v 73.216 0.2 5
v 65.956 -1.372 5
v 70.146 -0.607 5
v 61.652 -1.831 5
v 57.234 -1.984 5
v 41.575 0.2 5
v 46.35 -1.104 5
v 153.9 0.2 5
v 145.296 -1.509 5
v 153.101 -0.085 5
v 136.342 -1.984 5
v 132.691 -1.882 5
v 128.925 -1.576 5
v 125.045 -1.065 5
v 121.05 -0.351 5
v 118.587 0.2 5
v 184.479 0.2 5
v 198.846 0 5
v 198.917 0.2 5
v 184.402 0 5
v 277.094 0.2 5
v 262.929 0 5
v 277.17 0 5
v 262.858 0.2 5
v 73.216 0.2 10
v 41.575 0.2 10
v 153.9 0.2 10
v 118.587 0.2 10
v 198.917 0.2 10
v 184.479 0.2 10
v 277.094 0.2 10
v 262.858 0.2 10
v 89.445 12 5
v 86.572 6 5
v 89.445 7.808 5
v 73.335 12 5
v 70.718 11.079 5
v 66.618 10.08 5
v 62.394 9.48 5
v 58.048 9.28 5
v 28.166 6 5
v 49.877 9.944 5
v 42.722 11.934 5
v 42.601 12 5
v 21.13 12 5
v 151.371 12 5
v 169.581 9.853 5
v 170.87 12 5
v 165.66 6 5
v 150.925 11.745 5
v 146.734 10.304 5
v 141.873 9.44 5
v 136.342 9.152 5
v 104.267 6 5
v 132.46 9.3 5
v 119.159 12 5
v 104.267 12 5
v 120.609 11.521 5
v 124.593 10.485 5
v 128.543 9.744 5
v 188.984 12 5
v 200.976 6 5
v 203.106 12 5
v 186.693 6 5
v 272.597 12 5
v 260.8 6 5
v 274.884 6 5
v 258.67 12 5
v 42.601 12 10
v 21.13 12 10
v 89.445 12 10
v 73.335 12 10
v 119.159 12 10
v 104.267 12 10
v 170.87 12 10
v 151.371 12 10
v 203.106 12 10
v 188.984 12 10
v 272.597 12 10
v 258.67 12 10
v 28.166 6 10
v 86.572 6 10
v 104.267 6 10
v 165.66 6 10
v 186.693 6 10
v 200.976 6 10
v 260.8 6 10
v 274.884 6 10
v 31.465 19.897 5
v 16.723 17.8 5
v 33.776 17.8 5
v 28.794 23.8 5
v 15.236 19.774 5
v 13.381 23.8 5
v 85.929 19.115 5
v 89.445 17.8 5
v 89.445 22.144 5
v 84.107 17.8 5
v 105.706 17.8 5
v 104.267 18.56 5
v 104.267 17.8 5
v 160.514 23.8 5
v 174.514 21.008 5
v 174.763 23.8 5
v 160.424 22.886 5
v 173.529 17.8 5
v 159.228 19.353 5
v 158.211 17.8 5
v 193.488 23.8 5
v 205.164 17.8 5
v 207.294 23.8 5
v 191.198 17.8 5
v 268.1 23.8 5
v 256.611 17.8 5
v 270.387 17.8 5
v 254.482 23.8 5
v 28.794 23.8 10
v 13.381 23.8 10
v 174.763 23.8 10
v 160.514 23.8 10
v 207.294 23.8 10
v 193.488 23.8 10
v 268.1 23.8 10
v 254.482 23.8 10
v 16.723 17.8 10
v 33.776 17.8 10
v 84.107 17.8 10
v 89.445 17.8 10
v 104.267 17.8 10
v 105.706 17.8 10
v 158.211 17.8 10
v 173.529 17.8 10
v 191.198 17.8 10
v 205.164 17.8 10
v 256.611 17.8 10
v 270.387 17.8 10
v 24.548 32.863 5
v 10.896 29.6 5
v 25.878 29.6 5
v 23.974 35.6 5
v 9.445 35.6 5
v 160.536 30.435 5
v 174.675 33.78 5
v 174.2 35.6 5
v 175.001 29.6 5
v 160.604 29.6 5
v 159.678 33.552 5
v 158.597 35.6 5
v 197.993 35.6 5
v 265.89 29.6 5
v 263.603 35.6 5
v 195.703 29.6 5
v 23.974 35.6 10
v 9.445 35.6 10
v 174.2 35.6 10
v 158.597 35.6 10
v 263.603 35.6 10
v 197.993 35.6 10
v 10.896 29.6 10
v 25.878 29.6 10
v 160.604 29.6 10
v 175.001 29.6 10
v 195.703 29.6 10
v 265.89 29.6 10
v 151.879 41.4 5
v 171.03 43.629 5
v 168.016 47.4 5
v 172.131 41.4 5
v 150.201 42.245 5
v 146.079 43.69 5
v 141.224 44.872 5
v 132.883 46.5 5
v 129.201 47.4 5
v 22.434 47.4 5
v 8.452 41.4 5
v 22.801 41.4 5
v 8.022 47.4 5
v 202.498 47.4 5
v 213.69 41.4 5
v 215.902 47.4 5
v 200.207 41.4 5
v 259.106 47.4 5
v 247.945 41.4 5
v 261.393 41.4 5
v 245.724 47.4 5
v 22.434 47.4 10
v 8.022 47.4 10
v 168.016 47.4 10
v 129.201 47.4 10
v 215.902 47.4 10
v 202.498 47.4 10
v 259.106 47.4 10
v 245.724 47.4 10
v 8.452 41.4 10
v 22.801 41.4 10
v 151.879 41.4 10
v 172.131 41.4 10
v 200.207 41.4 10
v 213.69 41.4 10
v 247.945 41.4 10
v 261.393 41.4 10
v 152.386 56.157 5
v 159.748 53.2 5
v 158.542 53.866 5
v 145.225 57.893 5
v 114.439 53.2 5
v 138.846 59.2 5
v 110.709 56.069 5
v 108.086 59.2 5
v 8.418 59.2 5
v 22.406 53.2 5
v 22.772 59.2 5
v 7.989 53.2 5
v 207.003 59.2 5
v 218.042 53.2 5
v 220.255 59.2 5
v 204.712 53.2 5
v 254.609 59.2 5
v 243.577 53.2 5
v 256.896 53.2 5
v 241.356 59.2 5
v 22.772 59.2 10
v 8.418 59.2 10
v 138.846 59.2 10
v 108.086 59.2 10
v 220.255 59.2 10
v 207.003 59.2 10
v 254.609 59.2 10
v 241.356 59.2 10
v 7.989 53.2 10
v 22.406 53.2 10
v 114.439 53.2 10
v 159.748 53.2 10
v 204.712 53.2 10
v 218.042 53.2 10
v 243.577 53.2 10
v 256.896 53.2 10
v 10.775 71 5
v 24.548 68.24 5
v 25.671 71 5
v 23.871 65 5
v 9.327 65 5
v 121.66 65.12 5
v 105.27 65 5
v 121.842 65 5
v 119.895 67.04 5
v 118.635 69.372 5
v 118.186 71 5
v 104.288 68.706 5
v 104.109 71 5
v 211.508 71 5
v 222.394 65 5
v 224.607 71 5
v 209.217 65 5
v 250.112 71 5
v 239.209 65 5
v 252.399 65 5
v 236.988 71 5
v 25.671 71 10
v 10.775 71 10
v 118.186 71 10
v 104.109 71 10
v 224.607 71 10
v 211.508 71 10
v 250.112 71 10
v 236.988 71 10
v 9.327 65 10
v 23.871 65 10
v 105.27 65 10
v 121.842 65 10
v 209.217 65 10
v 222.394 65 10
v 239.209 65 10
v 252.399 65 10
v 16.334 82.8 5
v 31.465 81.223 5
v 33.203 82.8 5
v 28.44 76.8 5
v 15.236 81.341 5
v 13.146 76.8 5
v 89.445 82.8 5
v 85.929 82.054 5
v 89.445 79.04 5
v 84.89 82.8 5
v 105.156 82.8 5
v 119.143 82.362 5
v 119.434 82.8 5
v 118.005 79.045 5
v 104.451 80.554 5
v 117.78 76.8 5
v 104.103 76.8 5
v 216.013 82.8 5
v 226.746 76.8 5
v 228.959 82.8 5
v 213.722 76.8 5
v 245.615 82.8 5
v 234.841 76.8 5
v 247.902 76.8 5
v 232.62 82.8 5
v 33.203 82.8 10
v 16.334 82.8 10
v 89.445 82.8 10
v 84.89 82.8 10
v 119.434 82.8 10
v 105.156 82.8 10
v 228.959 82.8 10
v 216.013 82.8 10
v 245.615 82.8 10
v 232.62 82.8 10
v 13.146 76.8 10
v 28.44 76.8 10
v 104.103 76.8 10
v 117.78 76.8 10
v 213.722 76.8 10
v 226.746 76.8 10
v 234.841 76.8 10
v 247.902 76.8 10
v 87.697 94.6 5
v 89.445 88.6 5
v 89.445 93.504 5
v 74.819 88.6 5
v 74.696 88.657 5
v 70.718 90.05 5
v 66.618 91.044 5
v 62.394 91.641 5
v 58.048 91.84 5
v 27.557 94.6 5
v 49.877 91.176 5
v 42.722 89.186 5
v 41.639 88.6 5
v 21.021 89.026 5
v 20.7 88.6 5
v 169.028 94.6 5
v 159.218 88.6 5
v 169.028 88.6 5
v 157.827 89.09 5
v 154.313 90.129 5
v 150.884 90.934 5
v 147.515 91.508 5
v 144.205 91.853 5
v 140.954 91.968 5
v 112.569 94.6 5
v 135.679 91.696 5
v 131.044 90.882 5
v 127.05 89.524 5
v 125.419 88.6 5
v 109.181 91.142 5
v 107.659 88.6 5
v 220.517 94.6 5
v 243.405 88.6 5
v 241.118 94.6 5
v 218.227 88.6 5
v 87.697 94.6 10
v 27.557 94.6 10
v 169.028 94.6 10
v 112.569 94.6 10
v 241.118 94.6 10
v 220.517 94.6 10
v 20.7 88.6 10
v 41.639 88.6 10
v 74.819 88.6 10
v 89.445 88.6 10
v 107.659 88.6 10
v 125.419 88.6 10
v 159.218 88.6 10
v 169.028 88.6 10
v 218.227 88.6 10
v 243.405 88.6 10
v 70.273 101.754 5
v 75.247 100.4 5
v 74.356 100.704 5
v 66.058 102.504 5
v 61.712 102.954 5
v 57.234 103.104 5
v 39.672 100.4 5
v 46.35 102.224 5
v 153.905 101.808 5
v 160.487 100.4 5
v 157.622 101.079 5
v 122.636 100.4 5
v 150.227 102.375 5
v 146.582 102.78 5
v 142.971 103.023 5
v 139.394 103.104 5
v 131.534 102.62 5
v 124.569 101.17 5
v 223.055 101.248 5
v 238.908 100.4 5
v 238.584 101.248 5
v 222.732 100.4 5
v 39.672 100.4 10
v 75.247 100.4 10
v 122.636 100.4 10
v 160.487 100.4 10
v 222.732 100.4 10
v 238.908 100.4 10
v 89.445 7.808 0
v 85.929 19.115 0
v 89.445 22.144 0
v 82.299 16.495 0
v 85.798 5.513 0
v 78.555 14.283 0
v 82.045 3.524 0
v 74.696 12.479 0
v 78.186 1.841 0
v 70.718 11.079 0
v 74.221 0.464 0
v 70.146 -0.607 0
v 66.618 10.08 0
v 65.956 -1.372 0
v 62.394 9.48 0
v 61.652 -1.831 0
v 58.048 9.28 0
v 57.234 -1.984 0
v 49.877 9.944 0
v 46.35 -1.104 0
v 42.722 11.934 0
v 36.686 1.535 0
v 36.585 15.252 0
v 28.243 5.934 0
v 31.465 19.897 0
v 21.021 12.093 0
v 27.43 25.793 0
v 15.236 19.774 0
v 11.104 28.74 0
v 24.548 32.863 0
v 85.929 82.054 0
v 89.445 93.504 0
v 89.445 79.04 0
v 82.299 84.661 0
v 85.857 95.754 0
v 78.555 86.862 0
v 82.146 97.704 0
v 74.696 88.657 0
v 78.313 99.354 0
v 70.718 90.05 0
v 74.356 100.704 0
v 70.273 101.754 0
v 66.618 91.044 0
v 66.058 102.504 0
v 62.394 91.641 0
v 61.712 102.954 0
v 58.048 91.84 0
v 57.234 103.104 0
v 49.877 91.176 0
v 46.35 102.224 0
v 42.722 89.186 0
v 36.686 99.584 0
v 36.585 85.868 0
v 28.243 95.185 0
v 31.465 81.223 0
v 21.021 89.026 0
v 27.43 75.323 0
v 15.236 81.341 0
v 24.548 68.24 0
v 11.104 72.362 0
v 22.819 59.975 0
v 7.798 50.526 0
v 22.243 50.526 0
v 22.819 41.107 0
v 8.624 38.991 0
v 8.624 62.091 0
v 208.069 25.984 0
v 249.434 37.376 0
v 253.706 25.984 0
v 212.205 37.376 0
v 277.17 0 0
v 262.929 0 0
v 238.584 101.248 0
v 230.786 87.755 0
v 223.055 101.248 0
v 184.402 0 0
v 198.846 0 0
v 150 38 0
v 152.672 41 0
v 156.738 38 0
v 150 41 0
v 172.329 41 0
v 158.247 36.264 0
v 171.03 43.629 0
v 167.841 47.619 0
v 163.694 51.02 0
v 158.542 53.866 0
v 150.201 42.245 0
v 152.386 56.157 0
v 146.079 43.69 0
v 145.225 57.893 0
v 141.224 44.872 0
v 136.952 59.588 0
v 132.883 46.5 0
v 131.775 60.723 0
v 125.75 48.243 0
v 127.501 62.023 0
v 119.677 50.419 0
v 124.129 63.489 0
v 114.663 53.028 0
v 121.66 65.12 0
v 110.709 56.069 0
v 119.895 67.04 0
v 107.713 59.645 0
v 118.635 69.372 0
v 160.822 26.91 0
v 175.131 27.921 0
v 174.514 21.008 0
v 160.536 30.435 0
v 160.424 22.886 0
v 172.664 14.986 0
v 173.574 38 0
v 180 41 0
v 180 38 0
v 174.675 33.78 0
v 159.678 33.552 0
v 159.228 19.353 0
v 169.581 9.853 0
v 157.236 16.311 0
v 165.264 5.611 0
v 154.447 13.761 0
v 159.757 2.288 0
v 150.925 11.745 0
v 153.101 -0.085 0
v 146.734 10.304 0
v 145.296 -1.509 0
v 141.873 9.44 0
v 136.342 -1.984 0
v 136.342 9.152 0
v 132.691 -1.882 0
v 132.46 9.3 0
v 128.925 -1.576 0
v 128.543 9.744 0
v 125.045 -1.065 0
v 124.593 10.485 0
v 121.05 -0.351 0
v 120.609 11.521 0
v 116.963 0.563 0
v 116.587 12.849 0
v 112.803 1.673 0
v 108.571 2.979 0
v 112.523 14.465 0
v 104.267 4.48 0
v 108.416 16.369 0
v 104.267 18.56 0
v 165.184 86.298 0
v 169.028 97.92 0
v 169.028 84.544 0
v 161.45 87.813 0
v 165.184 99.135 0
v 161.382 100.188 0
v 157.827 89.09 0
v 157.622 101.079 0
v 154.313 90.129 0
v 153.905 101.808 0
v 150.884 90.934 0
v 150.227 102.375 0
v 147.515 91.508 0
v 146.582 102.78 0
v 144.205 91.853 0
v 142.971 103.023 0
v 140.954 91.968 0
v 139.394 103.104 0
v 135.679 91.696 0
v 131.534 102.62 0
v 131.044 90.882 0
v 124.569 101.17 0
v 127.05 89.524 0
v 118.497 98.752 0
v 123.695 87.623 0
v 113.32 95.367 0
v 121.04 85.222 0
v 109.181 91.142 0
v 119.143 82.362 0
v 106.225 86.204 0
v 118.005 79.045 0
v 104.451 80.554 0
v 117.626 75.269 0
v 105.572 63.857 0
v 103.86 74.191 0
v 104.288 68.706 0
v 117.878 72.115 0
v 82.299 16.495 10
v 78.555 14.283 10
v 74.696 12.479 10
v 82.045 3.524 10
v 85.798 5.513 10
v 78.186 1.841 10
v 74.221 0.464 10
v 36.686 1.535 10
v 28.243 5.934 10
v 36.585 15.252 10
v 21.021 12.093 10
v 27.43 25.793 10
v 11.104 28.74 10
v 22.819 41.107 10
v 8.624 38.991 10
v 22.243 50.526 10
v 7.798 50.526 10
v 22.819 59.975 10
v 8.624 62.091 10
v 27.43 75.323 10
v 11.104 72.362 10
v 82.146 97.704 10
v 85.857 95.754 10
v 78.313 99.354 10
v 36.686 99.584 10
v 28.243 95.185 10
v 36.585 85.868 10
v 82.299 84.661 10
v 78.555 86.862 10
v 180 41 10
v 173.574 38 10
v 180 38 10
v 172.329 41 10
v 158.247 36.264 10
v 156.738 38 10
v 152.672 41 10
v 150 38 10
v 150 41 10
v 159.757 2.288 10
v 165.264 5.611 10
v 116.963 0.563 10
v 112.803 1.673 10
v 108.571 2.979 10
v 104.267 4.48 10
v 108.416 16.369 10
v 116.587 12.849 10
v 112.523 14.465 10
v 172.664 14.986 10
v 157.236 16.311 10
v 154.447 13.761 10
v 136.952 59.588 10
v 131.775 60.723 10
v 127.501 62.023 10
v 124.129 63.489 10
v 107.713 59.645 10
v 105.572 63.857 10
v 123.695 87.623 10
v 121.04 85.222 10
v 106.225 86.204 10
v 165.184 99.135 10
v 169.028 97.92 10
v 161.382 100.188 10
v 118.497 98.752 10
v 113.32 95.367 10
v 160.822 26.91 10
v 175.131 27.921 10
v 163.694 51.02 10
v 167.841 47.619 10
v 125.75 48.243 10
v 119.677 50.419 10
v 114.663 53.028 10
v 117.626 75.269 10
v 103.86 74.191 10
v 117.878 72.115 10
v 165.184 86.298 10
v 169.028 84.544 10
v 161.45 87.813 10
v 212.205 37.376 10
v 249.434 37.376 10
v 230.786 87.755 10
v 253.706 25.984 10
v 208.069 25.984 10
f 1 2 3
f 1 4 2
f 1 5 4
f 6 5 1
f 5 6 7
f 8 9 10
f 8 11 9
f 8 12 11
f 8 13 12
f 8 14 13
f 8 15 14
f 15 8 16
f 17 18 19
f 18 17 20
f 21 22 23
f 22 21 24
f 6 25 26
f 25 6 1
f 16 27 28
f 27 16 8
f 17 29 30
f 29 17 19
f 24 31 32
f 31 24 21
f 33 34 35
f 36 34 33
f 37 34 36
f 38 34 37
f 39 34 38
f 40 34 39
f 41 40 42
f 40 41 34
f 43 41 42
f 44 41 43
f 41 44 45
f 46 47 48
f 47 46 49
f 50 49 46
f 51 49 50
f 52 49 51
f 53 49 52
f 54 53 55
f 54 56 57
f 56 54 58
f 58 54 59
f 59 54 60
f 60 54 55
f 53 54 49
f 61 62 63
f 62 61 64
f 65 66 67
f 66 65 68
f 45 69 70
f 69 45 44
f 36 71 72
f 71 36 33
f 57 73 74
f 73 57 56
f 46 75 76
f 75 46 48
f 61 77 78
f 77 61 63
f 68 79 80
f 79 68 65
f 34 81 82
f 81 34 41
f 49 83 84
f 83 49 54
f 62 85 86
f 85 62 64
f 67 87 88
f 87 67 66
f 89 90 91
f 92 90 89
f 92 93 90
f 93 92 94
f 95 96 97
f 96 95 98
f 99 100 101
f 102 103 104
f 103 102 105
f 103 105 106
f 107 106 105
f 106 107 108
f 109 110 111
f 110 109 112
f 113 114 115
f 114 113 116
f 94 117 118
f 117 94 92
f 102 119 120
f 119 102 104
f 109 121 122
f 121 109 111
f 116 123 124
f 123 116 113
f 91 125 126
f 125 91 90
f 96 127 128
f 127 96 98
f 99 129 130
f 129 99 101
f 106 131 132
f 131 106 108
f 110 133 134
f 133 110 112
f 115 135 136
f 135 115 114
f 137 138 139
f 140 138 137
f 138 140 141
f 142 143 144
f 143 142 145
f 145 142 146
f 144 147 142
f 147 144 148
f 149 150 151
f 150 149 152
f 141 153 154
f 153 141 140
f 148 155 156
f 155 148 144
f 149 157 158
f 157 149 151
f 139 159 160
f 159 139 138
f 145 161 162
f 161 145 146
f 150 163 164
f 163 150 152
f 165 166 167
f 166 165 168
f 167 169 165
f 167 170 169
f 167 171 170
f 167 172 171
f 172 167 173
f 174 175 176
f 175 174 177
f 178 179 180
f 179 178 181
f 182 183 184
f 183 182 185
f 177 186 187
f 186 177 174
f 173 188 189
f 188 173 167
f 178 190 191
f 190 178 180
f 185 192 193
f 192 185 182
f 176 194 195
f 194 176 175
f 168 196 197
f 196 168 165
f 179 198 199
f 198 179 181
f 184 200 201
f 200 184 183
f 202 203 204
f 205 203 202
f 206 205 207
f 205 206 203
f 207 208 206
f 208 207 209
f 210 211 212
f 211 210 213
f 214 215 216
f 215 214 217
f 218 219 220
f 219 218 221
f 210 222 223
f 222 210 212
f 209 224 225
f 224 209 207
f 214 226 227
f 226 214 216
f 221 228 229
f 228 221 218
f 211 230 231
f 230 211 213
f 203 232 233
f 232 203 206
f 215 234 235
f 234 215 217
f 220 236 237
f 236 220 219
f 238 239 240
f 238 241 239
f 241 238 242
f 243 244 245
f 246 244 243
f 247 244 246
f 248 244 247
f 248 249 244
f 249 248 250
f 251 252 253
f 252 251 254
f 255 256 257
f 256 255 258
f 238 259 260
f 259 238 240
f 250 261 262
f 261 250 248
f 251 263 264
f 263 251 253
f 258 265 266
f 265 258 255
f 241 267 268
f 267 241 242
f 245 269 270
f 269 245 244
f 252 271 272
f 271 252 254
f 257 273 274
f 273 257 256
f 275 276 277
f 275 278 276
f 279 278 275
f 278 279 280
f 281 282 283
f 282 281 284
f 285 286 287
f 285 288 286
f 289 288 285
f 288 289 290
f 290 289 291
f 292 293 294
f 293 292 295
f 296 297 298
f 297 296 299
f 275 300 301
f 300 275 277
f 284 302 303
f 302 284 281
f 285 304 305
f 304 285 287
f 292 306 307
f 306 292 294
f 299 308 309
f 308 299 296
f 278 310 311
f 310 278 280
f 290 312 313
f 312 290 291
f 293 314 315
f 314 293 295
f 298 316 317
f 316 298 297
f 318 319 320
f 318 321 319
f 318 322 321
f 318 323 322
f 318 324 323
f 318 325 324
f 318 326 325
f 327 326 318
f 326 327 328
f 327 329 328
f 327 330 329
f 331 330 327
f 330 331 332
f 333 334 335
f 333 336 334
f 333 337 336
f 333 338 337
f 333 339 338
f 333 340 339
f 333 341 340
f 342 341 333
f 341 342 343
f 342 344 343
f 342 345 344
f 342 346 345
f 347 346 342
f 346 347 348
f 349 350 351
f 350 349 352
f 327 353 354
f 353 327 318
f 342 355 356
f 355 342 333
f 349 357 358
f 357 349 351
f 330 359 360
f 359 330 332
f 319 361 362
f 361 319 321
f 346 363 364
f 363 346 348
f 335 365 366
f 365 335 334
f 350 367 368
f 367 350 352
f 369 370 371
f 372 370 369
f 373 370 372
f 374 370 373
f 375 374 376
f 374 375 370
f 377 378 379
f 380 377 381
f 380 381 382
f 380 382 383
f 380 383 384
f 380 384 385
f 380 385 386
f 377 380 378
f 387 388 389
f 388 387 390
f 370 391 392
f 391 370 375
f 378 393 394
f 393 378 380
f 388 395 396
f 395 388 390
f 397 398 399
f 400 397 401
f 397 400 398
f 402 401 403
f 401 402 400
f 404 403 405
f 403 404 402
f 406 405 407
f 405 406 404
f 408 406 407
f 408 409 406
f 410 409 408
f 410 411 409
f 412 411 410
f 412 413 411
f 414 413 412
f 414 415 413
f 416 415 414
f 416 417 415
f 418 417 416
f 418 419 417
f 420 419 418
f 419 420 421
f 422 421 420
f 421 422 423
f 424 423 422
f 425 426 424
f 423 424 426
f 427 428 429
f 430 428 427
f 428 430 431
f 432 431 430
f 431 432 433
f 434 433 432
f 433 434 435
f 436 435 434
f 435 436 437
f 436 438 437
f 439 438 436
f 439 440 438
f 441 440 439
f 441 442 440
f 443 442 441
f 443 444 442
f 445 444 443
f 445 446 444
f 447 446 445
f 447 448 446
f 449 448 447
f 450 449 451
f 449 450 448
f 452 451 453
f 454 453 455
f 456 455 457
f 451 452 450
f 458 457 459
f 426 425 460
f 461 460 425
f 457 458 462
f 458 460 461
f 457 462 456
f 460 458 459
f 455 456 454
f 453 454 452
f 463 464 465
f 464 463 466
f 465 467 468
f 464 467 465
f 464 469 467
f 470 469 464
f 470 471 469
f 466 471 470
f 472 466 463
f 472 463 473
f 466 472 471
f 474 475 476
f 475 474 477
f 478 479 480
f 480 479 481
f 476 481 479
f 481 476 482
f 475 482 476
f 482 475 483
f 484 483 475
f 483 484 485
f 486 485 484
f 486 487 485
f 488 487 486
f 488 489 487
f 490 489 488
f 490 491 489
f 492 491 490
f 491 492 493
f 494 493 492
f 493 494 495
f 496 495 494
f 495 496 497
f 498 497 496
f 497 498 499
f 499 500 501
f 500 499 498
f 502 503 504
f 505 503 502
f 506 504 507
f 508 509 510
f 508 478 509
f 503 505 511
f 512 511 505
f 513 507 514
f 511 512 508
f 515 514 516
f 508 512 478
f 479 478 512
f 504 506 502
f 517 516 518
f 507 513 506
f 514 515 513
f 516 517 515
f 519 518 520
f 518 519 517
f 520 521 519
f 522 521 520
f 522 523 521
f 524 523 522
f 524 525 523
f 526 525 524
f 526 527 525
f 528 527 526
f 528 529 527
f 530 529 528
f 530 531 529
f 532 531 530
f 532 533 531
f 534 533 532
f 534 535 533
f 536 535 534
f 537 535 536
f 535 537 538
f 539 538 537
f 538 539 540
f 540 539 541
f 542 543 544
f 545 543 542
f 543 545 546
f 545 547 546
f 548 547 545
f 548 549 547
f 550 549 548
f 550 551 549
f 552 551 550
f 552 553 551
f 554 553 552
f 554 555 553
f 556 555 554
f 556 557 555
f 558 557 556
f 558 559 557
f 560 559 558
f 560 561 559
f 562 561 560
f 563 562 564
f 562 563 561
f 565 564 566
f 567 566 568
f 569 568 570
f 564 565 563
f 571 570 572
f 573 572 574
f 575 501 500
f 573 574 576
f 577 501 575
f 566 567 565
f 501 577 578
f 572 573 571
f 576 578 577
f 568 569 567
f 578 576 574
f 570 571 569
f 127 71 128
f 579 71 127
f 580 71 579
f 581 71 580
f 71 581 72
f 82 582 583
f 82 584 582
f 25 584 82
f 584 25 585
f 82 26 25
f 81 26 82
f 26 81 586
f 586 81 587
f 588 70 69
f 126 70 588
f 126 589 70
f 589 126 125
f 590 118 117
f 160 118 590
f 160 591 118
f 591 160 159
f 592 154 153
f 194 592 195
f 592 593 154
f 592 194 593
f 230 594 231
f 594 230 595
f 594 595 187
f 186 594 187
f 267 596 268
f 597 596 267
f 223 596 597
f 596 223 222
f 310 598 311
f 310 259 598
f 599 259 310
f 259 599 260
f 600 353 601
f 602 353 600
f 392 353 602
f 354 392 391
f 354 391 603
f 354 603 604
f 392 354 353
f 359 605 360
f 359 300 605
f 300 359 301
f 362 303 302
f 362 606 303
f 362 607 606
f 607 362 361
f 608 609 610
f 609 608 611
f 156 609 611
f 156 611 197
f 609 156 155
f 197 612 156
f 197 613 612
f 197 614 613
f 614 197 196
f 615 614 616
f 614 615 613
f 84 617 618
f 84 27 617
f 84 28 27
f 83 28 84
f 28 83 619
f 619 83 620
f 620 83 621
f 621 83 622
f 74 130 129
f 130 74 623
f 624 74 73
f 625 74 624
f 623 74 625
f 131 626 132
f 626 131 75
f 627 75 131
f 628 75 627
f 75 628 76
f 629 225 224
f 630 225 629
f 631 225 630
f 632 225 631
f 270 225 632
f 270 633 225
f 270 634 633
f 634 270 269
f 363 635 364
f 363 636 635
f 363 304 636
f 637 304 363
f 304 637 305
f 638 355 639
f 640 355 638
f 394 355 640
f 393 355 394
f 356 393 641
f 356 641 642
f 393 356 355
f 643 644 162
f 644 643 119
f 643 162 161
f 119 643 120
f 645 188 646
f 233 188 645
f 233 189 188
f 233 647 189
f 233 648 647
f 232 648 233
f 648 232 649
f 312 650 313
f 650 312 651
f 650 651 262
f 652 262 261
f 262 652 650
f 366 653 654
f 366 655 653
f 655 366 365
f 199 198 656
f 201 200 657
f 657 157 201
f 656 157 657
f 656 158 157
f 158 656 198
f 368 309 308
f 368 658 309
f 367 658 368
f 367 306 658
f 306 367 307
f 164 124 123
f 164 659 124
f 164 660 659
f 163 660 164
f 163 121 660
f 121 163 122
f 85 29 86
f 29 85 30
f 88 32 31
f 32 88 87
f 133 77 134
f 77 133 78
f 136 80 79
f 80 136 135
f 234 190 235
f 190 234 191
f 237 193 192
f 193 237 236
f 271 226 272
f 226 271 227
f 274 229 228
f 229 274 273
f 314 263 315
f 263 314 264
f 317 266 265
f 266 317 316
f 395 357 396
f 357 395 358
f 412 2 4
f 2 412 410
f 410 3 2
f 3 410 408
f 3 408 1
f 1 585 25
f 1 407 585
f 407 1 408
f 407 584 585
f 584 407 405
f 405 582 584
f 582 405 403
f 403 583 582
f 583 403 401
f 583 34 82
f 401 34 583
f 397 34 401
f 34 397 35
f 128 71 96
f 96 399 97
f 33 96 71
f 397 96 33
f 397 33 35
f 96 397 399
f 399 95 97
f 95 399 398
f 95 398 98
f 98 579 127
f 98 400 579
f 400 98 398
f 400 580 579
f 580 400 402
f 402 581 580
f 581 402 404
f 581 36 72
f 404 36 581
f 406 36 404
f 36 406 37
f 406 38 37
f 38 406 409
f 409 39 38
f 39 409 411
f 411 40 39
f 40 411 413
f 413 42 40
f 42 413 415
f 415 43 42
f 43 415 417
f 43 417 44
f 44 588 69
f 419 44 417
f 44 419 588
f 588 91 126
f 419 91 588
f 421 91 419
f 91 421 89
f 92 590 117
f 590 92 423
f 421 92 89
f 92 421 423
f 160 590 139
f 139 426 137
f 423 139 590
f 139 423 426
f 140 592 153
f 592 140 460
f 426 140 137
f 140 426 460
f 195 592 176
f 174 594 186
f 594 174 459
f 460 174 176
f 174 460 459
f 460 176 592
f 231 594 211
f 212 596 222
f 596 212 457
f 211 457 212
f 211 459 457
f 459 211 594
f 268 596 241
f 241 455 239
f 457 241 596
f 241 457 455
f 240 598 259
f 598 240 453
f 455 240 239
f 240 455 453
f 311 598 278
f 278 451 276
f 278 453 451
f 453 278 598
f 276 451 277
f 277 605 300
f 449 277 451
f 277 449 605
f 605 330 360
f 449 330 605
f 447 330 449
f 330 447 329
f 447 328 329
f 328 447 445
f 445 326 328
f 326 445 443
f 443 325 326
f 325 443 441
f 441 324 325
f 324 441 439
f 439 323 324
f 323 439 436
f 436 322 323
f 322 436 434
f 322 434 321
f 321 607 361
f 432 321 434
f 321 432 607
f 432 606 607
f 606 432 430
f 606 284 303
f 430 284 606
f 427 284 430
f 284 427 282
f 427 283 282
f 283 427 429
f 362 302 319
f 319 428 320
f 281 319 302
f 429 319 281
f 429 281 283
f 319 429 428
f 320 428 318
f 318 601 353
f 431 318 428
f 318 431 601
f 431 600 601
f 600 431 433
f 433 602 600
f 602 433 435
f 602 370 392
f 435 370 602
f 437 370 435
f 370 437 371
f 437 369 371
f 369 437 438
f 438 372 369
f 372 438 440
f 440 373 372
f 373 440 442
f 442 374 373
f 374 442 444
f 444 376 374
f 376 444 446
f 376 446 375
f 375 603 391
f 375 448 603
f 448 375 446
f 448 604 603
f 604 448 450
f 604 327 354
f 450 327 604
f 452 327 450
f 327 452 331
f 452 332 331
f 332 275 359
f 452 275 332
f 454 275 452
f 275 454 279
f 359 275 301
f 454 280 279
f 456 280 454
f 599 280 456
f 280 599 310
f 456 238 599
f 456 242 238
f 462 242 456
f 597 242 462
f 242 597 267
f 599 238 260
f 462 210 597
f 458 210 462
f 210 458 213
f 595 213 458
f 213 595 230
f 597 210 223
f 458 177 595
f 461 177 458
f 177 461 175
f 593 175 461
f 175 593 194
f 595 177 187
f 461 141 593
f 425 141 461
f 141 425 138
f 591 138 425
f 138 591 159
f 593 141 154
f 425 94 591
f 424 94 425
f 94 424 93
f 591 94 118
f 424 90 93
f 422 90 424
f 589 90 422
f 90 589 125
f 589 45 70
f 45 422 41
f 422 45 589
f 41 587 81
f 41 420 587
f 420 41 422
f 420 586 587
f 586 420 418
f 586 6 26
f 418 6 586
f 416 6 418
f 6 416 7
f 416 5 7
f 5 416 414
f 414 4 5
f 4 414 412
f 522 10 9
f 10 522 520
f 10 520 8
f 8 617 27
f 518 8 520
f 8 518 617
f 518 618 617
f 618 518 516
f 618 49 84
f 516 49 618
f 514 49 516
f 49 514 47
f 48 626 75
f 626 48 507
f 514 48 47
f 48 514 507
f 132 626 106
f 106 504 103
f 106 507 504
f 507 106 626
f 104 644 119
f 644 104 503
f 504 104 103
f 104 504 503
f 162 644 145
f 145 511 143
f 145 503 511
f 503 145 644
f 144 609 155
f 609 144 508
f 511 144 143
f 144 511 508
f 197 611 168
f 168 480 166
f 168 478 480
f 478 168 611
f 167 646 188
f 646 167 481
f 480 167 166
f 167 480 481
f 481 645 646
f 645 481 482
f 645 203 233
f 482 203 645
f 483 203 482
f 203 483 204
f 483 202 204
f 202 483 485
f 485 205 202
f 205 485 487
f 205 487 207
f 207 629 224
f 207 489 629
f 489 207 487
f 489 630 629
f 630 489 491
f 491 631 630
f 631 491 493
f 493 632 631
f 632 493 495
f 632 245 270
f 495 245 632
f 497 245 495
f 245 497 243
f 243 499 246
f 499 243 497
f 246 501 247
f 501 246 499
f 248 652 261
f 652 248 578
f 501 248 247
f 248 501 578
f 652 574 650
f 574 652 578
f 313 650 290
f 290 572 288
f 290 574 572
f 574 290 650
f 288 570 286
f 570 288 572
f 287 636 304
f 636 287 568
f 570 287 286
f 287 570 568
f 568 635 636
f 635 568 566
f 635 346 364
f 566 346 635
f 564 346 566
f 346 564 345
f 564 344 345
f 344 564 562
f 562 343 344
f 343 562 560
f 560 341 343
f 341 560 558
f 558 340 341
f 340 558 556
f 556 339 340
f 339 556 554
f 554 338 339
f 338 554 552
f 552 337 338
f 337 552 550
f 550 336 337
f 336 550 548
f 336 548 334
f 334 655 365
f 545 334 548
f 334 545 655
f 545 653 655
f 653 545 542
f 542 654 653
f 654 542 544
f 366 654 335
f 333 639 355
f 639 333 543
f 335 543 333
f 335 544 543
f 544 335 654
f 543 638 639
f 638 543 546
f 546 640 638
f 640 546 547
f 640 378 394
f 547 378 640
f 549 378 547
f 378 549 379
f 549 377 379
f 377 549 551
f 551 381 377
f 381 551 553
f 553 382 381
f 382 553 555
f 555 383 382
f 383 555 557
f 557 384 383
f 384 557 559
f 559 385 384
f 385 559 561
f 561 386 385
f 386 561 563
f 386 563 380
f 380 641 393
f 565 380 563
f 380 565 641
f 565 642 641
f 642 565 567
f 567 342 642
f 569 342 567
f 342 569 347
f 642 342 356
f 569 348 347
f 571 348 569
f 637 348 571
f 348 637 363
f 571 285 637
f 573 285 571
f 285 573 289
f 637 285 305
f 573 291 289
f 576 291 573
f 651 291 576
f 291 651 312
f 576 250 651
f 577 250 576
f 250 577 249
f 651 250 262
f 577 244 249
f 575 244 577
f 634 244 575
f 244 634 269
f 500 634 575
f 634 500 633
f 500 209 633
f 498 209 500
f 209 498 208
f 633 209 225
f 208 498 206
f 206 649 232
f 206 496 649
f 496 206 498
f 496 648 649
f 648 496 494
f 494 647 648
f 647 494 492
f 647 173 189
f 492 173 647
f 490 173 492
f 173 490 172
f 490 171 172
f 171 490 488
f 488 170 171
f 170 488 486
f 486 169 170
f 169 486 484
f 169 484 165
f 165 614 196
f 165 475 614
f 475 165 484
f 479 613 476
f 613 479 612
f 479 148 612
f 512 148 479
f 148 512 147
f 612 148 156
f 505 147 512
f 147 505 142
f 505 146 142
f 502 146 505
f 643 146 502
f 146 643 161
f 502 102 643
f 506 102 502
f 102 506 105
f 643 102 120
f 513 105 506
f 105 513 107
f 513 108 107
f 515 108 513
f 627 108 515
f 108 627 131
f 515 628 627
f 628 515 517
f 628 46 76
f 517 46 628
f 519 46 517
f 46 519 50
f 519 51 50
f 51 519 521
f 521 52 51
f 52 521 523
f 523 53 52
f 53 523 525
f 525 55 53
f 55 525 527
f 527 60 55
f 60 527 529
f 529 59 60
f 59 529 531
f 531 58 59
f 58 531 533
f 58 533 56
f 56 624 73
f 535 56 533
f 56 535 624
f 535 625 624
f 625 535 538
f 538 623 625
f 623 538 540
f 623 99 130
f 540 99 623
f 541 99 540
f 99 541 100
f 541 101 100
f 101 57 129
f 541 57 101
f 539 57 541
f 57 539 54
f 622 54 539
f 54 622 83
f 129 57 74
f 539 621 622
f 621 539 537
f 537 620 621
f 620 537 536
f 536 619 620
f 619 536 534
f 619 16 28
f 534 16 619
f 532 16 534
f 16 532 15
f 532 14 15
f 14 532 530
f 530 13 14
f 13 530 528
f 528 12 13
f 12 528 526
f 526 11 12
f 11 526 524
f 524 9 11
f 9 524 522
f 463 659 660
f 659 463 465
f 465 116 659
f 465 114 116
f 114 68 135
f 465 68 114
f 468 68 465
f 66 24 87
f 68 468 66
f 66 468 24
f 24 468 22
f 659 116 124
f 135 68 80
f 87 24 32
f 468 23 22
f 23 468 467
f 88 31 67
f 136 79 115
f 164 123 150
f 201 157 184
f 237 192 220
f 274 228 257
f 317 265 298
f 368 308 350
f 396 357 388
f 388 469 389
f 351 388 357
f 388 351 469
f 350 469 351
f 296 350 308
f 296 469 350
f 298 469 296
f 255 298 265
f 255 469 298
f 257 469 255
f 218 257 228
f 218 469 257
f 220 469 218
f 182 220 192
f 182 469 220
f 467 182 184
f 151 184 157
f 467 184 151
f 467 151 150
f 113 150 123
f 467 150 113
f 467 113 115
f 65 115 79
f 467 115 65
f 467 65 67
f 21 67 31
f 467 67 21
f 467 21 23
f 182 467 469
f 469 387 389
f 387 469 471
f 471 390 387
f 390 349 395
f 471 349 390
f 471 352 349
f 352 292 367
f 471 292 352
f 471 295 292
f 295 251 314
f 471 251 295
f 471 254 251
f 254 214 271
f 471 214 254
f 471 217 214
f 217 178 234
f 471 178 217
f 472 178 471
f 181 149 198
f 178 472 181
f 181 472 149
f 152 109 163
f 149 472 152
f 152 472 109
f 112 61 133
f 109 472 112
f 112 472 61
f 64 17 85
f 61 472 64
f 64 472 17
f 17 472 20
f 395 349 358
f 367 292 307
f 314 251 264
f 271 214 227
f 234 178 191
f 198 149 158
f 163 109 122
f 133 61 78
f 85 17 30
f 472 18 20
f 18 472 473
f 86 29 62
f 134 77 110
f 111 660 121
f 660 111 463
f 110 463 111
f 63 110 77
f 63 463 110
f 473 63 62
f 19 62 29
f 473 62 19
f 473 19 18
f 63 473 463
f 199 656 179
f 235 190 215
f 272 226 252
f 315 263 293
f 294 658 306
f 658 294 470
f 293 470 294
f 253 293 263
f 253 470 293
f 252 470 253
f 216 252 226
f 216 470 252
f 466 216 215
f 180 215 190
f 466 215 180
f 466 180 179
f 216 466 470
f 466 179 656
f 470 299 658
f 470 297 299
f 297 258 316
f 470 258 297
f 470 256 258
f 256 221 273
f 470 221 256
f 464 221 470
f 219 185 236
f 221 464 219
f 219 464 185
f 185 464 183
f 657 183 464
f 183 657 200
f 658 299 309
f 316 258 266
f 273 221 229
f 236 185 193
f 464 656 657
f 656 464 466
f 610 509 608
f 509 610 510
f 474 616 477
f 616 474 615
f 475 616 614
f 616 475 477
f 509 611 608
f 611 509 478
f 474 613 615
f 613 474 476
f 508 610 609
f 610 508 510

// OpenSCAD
char_size = 100;
char_h = 10;

line_width = 18/3;
line_pitch = 18/3 - 0.2;
line_offset = 3;

base_h = 5;

union() {
// 文字から横線部分を抜く
difference() {

    // 文字
    linear_extrude(char_h)
    text("CSA", font="IBM Block Serif", size=char_size);
    
    // 横線部分
    translate([0, 0, base_h])
    union() {
        translate([0, line_offset, 0])
            for (i = [-20:20]) {
                translate([0, i * (line_pitch + line_width) + line_offset, 0])
                    cube([char_size * 10, line_width, char_h + base_h]);
            }
    }
}

translate([150, 38, 0])
    cube([30, 3, char_h]);
}
